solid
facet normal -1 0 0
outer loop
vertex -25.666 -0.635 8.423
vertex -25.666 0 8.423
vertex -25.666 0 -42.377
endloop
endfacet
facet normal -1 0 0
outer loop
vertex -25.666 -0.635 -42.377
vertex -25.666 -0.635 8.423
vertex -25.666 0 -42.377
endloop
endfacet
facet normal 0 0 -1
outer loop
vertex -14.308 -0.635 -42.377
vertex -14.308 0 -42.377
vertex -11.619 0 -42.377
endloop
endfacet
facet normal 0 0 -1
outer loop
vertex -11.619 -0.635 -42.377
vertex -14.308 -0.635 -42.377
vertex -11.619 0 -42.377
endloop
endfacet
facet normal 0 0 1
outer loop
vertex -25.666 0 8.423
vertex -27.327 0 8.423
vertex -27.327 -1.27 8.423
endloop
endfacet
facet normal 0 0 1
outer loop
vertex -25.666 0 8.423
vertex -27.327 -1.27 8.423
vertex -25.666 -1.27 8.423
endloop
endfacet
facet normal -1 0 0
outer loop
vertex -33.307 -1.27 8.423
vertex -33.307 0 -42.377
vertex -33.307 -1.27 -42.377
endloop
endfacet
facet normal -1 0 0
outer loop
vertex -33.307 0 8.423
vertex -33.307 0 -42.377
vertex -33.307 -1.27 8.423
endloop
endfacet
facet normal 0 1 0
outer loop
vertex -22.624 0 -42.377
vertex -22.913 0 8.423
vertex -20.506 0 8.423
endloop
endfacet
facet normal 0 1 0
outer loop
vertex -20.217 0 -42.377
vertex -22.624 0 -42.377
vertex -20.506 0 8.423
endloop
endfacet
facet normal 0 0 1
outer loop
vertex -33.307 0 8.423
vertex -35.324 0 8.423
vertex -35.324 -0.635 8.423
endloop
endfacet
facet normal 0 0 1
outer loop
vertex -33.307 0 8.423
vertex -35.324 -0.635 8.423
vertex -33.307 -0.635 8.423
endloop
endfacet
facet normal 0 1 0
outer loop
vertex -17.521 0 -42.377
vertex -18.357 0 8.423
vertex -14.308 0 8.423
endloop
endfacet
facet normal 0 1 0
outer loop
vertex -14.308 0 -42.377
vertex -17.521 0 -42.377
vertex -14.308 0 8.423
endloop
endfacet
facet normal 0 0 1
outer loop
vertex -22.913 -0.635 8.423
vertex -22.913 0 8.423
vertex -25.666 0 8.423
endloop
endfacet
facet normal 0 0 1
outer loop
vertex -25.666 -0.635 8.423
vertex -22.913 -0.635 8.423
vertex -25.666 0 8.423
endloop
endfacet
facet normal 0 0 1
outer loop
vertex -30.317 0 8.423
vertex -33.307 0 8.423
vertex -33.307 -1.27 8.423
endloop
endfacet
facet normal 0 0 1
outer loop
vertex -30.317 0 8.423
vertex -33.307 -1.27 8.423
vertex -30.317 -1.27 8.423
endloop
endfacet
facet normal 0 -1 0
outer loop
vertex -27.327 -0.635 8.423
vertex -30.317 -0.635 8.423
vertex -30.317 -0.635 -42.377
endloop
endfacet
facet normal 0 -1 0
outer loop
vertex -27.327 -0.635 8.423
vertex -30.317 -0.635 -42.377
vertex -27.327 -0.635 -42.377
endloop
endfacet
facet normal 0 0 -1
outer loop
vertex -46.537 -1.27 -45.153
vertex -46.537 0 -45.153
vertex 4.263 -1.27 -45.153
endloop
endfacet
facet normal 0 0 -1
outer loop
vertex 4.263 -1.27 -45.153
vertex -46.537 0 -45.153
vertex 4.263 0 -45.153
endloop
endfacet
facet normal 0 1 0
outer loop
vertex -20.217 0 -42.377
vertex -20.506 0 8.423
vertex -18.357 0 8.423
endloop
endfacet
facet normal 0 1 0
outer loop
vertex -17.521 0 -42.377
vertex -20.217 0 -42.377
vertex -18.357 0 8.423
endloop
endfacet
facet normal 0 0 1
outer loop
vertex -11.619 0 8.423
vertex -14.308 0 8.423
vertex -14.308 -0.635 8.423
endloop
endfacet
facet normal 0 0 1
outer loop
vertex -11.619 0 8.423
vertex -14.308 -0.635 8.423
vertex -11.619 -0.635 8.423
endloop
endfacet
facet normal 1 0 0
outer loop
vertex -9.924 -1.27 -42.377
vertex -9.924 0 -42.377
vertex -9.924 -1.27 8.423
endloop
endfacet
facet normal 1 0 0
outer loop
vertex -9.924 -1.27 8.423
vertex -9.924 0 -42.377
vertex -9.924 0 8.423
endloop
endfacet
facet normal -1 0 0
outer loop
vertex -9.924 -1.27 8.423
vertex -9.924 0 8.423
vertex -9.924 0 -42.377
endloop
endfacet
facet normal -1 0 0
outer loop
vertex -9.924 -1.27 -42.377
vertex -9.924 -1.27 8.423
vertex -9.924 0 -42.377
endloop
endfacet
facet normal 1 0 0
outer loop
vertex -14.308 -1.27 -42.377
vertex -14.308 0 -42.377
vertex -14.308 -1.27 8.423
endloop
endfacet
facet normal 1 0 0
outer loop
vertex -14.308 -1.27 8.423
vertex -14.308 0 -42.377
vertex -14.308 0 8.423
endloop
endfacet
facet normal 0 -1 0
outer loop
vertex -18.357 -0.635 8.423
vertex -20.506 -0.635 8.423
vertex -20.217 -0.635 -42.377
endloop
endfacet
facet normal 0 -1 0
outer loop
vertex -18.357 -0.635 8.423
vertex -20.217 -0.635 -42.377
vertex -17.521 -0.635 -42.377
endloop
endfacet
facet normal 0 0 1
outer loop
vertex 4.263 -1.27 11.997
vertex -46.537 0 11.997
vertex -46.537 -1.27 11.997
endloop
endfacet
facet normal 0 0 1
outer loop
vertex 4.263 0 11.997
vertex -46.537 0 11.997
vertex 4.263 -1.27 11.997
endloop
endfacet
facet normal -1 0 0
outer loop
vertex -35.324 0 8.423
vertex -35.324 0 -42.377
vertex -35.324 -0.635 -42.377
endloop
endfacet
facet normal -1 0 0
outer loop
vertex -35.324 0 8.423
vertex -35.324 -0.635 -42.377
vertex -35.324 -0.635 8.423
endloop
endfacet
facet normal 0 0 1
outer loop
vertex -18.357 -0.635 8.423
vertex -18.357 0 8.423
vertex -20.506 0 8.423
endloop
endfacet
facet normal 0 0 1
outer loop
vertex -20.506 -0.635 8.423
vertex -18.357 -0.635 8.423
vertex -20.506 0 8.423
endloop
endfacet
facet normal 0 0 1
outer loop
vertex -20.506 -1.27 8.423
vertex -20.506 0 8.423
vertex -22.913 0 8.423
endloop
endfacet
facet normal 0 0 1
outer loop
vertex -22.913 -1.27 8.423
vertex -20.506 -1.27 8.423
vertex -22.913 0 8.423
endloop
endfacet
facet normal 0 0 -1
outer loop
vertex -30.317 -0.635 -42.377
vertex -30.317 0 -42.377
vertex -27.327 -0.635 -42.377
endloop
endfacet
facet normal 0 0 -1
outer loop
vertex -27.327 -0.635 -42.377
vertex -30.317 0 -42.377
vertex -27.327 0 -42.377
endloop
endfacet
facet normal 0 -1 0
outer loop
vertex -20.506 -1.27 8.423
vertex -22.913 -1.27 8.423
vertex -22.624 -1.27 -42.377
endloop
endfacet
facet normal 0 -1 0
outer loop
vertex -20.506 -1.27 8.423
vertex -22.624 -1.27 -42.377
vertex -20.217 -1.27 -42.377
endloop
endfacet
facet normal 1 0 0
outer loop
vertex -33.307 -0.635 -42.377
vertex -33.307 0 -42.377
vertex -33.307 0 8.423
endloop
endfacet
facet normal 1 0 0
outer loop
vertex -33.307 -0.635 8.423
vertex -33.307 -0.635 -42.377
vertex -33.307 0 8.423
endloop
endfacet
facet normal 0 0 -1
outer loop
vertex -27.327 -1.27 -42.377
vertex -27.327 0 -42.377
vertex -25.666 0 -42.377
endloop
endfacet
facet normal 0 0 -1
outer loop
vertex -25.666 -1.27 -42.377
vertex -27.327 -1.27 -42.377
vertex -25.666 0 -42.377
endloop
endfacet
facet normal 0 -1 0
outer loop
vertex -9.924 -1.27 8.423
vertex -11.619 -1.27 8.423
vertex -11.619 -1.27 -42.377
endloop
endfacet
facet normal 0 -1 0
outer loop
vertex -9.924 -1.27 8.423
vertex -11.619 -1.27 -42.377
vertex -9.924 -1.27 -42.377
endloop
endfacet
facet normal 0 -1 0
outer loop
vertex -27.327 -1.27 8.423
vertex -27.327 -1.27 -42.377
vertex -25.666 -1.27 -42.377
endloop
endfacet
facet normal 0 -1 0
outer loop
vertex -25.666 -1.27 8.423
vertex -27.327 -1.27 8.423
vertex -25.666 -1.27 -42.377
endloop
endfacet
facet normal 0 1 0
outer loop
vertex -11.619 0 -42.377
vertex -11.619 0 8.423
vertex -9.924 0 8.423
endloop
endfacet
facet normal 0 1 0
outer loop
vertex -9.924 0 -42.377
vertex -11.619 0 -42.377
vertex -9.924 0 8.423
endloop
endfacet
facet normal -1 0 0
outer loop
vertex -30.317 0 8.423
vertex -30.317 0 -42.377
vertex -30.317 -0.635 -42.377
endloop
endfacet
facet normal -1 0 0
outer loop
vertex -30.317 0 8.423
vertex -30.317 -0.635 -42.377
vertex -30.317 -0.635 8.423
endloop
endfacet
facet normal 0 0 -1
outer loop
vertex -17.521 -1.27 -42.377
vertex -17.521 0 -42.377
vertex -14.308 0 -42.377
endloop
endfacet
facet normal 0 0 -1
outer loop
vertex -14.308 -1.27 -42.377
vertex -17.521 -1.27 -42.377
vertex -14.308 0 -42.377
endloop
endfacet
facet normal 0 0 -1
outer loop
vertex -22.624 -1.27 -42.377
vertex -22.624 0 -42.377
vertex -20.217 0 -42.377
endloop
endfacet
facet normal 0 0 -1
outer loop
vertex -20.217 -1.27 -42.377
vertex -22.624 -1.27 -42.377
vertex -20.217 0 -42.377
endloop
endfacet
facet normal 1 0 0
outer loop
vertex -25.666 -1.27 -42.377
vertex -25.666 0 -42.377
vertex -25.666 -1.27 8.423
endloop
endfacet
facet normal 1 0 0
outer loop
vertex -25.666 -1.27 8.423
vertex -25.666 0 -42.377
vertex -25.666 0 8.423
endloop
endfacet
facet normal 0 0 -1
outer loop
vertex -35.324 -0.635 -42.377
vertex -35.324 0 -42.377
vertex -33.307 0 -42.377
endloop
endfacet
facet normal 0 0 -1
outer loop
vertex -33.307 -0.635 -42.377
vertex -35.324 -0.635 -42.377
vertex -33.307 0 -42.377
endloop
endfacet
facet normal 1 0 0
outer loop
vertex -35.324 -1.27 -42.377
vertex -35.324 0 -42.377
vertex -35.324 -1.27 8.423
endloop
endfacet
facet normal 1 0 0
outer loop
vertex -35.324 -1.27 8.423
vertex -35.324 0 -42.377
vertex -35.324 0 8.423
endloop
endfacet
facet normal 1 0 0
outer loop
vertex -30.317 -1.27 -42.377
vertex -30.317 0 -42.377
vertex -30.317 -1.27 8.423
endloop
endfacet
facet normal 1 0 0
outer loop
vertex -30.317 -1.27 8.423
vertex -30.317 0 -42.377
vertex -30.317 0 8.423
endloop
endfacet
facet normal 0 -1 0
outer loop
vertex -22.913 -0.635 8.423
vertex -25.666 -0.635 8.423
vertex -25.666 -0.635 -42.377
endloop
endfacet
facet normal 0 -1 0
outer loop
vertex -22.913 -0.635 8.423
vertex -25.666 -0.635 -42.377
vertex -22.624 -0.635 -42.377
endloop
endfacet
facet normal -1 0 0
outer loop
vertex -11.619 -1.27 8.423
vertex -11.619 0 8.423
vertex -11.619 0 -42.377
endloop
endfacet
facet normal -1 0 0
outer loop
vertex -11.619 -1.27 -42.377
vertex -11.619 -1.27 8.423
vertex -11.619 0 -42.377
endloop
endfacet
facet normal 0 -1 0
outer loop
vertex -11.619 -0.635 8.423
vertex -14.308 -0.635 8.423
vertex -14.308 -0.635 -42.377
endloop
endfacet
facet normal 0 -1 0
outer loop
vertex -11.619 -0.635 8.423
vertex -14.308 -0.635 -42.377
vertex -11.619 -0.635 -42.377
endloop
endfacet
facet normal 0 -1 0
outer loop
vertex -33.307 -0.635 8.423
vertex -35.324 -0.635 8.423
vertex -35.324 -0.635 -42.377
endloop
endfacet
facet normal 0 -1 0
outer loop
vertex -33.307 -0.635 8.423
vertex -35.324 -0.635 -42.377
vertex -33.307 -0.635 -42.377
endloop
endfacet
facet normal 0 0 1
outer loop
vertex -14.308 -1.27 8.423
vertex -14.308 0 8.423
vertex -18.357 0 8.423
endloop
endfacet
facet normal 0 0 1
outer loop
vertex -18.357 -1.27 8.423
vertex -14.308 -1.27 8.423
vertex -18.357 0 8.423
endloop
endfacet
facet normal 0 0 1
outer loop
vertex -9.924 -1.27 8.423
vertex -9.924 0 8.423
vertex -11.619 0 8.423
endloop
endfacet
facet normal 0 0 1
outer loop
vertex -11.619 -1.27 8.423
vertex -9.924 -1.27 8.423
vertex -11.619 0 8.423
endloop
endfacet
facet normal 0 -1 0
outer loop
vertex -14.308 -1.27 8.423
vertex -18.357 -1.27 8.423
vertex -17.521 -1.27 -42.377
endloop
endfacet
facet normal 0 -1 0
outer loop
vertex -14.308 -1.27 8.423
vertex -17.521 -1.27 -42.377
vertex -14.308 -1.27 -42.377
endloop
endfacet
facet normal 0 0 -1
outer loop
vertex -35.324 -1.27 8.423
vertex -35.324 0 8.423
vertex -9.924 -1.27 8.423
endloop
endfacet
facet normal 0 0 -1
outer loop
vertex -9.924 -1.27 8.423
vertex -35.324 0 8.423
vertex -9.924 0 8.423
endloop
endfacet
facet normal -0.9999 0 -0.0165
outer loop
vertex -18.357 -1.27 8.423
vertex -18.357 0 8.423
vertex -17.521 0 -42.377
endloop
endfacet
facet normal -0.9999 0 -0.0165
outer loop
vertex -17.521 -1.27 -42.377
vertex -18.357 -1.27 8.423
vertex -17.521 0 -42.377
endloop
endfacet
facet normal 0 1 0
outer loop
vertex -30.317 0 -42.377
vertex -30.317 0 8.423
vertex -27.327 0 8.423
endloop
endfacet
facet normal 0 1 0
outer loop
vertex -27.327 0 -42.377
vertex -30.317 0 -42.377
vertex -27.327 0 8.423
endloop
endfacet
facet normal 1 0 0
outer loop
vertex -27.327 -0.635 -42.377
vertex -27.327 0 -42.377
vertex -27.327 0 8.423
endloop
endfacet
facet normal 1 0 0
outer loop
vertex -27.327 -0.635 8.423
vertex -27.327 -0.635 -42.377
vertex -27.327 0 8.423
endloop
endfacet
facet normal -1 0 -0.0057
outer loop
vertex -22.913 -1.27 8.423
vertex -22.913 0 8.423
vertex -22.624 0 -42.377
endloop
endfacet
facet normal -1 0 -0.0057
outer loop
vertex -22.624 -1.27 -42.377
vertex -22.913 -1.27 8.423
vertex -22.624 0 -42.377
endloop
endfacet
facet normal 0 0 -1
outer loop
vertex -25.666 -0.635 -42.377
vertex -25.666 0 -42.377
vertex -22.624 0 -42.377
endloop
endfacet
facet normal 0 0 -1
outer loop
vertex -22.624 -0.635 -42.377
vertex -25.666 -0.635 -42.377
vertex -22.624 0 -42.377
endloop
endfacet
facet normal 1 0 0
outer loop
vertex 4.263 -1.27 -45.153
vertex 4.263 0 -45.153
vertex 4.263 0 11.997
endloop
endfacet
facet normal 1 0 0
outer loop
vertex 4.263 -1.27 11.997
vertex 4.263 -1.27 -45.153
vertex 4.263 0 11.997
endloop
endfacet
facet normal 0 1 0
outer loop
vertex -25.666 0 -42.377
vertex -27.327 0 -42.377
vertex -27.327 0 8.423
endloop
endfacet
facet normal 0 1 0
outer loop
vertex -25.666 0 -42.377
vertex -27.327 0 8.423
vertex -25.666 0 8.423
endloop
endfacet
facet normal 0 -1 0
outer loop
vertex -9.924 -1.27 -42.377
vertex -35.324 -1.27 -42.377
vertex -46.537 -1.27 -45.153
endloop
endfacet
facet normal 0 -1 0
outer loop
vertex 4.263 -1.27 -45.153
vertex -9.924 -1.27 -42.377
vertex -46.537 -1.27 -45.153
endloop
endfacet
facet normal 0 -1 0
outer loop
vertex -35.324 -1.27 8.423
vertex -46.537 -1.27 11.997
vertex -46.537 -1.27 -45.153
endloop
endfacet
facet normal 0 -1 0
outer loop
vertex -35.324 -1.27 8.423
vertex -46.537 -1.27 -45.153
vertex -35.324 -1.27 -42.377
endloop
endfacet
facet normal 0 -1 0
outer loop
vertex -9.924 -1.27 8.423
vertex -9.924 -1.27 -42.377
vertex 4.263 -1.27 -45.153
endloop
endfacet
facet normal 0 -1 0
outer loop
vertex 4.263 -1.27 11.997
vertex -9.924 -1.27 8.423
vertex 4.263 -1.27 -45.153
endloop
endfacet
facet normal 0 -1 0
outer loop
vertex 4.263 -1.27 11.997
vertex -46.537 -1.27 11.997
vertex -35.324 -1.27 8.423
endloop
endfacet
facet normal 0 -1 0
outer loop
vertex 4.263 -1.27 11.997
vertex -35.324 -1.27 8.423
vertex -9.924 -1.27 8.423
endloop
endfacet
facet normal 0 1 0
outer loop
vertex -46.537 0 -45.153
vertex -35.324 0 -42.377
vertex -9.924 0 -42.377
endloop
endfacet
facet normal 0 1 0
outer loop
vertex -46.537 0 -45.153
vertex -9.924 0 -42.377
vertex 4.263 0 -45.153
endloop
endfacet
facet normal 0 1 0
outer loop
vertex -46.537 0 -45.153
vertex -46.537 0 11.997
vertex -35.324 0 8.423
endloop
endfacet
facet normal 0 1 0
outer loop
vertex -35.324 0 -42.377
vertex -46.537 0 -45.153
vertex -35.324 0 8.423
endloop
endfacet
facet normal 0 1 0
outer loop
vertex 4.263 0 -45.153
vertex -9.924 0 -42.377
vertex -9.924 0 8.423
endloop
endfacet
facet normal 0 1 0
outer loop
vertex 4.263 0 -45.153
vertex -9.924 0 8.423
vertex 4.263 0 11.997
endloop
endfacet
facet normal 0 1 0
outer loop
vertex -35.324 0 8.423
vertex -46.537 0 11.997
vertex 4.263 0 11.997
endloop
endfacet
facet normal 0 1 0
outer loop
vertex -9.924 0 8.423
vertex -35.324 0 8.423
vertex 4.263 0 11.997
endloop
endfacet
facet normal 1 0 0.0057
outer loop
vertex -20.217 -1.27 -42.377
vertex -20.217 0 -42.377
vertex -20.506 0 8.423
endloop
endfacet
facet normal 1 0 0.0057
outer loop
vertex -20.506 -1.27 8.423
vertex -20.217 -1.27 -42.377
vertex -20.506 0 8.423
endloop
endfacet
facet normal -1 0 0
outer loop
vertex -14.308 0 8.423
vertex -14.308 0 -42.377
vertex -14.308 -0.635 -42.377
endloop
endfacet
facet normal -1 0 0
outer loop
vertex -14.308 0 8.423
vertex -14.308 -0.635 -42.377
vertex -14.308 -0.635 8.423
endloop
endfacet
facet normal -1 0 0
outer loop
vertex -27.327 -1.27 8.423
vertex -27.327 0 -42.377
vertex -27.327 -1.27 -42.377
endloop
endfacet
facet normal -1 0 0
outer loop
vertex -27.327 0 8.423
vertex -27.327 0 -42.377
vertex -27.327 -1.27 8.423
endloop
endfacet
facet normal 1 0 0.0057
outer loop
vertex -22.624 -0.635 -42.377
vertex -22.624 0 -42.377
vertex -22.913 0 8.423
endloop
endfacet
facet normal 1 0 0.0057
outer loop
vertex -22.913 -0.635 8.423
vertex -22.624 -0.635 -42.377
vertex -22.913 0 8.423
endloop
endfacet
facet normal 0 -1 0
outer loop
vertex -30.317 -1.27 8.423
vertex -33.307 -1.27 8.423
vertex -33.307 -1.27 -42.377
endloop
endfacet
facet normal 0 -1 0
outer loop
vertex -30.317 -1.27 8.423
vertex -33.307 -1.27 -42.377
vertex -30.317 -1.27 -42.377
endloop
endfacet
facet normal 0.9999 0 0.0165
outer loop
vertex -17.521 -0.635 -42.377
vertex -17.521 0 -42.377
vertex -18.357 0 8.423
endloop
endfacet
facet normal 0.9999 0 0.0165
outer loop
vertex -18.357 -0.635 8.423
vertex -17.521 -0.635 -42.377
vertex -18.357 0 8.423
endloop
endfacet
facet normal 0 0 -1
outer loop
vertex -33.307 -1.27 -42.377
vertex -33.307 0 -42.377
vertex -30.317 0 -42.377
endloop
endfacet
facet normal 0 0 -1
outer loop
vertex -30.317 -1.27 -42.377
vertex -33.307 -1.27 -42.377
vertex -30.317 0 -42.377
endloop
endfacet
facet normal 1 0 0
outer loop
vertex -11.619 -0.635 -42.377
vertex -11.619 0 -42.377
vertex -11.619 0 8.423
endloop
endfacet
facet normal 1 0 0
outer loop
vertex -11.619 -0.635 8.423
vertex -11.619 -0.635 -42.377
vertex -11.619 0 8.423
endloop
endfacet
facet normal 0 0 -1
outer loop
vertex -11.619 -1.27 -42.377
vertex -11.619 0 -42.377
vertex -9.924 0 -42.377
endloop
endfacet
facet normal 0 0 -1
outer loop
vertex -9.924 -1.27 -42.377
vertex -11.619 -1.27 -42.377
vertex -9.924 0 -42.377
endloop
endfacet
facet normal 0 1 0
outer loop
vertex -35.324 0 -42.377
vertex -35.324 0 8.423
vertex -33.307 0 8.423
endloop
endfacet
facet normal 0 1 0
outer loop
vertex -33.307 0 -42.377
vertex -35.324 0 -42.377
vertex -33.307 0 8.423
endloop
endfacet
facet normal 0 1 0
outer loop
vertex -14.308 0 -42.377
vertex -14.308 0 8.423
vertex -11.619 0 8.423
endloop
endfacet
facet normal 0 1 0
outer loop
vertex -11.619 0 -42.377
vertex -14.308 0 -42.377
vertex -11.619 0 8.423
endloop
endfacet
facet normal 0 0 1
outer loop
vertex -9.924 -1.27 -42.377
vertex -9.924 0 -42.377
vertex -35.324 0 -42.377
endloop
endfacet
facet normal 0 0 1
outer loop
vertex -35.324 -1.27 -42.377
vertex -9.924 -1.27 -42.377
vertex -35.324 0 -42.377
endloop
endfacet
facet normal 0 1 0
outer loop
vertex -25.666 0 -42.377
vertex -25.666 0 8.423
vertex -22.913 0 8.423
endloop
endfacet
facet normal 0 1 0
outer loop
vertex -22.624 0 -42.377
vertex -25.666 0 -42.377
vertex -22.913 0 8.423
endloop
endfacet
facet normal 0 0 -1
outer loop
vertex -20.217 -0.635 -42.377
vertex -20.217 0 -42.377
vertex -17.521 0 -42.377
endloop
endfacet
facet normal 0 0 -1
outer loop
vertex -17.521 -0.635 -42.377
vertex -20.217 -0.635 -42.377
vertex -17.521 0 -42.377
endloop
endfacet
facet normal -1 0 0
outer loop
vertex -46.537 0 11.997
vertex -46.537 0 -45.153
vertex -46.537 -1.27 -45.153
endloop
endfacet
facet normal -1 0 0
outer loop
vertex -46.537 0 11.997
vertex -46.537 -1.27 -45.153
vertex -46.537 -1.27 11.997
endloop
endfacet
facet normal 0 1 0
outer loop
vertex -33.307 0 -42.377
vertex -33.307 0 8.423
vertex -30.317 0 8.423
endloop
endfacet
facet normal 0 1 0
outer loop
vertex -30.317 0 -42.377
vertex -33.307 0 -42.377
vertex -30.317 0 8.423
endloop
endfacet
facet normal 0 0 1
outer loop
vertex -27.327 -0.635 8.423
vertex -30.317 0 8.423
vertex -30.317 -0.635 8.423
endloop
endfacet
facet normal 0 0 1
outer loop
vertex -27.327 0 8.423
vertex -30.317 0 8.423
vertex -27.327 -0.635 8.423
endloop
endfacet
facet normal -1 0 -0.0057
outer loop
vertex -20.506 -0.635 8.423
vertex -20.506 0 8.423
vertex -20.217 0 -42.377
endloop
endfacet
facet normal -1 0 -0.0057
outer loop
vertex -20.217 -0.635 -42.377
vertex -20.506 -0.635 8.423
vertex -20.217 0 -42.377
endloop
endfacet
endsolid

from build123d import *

# Parameters (mm, degrees)
F0_W     = 2.016035
F0_H     = 50.8
F0_W_2   = 2.990041
F0_W_3   = 2.688913
F1_DEPTH = 0.635
F0_W_4   = 2.990043
F0_W_5   = 1.661135
F2_DEPTH = 1.27
F0_W_6   = 50.8
F0_H_2   = 57.15
F3_DEPTH = 1.27


with BuildPart() as f1:
    # F0 (on Front) → F1 (new body)
    with BuildSketch(Plane.XZ):
        with Locations((-34.315511, -16.976795)):
            Rectangle(F0_W, F0_H)
        with Locations((-28.822429, -16.976795)):
            Rectangle(F0_W_2, F0_H)
        Polygon((-22.912512, 8.423205), (-25.666274, 8.423205), (-25.666274, -42.376795), (-22.912512, -42.376795), (-22.623528, -42.376795), align=None)
        Polygon((-18.357284, 8.423205), (-20.505905, 8.423205), (-20.216922, -42.376795), (-17.521333, -42.376795), align=None)
        with Locations((-12.963811, -16.976795)):
            Rectangle(F0_W_3, F0_H)
    extrude(amount=F1_DEPTH)


with BuildPart() as f2:
    # F0 (on Front) → F2 (new body)
    with BuildSketch(Plane.XZ):
        with Locations((-31.812472, -16.976795)):
            Rectangle(F0_W_4, F0_H)
        with Locations((-26.496841, -16.976795)):
            Rectangle(F0_W_5, F0_H)
        Polygon((-20.505905, 8.423205), (-22.912512, 8.423205), (-22.623528, -42.376795), (-20.216922, -42.376795), align=None)
        Polygon((-14.308268, 8.423205), (-18.357284, 8.423205), (-17.521333, -42.376795), (-14.308268, -42.376795), align=None)
        Polygon((-9.923528, 8.423205), (-11.619355, 8.423205), (-11.619355, -42.376795), (-11.311764, -42.376795), (-9.923528, -42.376795), align=None)
    extrude(amount=F2_DEPTH)


with BuildPart() as f3:
    # F0 (on Front) → F3 (new body)
    with BuildSketch(Plane.XZ):
        with Locations((-21.136952, -16.57828)):
            Rectangle(F0_W_6, F0_H_2)
        Polygon((-35.323528, -42.376795), (-35.323528, 8.423205), (-33.307493, 8.423205), (-30.31745, 8.423205), (-27.327409, 8.423205), (-25.666274, 8.423205), (-22.912512, 8.423205), (-20.505905, 8.423205), (-18.357284, 8.423205), (-14.308268, 8.423205), (-11.619355, 8.423205), (-9.923528, 8.423205), (-9.923528, -42.376795), (-11.311764, -42.376795), (-11.619355, -42.376795), (-14.308268, -42.376795), (-17.521333, -42.376795), (-20.216922, -42.376795), (-22.623528, -42.376795), (-22.912512, -42.376795), (-25.666274, -42.376795), (-27.327409, -42.376795), (-30.31745, -42.376795), (-33.307493, -42.376795), align=None, mode=Mode.SUBTRACT)
    extrude(amount=F3_DEPTH)


solid = Compound([f1.part, f2.part, f3.part])
